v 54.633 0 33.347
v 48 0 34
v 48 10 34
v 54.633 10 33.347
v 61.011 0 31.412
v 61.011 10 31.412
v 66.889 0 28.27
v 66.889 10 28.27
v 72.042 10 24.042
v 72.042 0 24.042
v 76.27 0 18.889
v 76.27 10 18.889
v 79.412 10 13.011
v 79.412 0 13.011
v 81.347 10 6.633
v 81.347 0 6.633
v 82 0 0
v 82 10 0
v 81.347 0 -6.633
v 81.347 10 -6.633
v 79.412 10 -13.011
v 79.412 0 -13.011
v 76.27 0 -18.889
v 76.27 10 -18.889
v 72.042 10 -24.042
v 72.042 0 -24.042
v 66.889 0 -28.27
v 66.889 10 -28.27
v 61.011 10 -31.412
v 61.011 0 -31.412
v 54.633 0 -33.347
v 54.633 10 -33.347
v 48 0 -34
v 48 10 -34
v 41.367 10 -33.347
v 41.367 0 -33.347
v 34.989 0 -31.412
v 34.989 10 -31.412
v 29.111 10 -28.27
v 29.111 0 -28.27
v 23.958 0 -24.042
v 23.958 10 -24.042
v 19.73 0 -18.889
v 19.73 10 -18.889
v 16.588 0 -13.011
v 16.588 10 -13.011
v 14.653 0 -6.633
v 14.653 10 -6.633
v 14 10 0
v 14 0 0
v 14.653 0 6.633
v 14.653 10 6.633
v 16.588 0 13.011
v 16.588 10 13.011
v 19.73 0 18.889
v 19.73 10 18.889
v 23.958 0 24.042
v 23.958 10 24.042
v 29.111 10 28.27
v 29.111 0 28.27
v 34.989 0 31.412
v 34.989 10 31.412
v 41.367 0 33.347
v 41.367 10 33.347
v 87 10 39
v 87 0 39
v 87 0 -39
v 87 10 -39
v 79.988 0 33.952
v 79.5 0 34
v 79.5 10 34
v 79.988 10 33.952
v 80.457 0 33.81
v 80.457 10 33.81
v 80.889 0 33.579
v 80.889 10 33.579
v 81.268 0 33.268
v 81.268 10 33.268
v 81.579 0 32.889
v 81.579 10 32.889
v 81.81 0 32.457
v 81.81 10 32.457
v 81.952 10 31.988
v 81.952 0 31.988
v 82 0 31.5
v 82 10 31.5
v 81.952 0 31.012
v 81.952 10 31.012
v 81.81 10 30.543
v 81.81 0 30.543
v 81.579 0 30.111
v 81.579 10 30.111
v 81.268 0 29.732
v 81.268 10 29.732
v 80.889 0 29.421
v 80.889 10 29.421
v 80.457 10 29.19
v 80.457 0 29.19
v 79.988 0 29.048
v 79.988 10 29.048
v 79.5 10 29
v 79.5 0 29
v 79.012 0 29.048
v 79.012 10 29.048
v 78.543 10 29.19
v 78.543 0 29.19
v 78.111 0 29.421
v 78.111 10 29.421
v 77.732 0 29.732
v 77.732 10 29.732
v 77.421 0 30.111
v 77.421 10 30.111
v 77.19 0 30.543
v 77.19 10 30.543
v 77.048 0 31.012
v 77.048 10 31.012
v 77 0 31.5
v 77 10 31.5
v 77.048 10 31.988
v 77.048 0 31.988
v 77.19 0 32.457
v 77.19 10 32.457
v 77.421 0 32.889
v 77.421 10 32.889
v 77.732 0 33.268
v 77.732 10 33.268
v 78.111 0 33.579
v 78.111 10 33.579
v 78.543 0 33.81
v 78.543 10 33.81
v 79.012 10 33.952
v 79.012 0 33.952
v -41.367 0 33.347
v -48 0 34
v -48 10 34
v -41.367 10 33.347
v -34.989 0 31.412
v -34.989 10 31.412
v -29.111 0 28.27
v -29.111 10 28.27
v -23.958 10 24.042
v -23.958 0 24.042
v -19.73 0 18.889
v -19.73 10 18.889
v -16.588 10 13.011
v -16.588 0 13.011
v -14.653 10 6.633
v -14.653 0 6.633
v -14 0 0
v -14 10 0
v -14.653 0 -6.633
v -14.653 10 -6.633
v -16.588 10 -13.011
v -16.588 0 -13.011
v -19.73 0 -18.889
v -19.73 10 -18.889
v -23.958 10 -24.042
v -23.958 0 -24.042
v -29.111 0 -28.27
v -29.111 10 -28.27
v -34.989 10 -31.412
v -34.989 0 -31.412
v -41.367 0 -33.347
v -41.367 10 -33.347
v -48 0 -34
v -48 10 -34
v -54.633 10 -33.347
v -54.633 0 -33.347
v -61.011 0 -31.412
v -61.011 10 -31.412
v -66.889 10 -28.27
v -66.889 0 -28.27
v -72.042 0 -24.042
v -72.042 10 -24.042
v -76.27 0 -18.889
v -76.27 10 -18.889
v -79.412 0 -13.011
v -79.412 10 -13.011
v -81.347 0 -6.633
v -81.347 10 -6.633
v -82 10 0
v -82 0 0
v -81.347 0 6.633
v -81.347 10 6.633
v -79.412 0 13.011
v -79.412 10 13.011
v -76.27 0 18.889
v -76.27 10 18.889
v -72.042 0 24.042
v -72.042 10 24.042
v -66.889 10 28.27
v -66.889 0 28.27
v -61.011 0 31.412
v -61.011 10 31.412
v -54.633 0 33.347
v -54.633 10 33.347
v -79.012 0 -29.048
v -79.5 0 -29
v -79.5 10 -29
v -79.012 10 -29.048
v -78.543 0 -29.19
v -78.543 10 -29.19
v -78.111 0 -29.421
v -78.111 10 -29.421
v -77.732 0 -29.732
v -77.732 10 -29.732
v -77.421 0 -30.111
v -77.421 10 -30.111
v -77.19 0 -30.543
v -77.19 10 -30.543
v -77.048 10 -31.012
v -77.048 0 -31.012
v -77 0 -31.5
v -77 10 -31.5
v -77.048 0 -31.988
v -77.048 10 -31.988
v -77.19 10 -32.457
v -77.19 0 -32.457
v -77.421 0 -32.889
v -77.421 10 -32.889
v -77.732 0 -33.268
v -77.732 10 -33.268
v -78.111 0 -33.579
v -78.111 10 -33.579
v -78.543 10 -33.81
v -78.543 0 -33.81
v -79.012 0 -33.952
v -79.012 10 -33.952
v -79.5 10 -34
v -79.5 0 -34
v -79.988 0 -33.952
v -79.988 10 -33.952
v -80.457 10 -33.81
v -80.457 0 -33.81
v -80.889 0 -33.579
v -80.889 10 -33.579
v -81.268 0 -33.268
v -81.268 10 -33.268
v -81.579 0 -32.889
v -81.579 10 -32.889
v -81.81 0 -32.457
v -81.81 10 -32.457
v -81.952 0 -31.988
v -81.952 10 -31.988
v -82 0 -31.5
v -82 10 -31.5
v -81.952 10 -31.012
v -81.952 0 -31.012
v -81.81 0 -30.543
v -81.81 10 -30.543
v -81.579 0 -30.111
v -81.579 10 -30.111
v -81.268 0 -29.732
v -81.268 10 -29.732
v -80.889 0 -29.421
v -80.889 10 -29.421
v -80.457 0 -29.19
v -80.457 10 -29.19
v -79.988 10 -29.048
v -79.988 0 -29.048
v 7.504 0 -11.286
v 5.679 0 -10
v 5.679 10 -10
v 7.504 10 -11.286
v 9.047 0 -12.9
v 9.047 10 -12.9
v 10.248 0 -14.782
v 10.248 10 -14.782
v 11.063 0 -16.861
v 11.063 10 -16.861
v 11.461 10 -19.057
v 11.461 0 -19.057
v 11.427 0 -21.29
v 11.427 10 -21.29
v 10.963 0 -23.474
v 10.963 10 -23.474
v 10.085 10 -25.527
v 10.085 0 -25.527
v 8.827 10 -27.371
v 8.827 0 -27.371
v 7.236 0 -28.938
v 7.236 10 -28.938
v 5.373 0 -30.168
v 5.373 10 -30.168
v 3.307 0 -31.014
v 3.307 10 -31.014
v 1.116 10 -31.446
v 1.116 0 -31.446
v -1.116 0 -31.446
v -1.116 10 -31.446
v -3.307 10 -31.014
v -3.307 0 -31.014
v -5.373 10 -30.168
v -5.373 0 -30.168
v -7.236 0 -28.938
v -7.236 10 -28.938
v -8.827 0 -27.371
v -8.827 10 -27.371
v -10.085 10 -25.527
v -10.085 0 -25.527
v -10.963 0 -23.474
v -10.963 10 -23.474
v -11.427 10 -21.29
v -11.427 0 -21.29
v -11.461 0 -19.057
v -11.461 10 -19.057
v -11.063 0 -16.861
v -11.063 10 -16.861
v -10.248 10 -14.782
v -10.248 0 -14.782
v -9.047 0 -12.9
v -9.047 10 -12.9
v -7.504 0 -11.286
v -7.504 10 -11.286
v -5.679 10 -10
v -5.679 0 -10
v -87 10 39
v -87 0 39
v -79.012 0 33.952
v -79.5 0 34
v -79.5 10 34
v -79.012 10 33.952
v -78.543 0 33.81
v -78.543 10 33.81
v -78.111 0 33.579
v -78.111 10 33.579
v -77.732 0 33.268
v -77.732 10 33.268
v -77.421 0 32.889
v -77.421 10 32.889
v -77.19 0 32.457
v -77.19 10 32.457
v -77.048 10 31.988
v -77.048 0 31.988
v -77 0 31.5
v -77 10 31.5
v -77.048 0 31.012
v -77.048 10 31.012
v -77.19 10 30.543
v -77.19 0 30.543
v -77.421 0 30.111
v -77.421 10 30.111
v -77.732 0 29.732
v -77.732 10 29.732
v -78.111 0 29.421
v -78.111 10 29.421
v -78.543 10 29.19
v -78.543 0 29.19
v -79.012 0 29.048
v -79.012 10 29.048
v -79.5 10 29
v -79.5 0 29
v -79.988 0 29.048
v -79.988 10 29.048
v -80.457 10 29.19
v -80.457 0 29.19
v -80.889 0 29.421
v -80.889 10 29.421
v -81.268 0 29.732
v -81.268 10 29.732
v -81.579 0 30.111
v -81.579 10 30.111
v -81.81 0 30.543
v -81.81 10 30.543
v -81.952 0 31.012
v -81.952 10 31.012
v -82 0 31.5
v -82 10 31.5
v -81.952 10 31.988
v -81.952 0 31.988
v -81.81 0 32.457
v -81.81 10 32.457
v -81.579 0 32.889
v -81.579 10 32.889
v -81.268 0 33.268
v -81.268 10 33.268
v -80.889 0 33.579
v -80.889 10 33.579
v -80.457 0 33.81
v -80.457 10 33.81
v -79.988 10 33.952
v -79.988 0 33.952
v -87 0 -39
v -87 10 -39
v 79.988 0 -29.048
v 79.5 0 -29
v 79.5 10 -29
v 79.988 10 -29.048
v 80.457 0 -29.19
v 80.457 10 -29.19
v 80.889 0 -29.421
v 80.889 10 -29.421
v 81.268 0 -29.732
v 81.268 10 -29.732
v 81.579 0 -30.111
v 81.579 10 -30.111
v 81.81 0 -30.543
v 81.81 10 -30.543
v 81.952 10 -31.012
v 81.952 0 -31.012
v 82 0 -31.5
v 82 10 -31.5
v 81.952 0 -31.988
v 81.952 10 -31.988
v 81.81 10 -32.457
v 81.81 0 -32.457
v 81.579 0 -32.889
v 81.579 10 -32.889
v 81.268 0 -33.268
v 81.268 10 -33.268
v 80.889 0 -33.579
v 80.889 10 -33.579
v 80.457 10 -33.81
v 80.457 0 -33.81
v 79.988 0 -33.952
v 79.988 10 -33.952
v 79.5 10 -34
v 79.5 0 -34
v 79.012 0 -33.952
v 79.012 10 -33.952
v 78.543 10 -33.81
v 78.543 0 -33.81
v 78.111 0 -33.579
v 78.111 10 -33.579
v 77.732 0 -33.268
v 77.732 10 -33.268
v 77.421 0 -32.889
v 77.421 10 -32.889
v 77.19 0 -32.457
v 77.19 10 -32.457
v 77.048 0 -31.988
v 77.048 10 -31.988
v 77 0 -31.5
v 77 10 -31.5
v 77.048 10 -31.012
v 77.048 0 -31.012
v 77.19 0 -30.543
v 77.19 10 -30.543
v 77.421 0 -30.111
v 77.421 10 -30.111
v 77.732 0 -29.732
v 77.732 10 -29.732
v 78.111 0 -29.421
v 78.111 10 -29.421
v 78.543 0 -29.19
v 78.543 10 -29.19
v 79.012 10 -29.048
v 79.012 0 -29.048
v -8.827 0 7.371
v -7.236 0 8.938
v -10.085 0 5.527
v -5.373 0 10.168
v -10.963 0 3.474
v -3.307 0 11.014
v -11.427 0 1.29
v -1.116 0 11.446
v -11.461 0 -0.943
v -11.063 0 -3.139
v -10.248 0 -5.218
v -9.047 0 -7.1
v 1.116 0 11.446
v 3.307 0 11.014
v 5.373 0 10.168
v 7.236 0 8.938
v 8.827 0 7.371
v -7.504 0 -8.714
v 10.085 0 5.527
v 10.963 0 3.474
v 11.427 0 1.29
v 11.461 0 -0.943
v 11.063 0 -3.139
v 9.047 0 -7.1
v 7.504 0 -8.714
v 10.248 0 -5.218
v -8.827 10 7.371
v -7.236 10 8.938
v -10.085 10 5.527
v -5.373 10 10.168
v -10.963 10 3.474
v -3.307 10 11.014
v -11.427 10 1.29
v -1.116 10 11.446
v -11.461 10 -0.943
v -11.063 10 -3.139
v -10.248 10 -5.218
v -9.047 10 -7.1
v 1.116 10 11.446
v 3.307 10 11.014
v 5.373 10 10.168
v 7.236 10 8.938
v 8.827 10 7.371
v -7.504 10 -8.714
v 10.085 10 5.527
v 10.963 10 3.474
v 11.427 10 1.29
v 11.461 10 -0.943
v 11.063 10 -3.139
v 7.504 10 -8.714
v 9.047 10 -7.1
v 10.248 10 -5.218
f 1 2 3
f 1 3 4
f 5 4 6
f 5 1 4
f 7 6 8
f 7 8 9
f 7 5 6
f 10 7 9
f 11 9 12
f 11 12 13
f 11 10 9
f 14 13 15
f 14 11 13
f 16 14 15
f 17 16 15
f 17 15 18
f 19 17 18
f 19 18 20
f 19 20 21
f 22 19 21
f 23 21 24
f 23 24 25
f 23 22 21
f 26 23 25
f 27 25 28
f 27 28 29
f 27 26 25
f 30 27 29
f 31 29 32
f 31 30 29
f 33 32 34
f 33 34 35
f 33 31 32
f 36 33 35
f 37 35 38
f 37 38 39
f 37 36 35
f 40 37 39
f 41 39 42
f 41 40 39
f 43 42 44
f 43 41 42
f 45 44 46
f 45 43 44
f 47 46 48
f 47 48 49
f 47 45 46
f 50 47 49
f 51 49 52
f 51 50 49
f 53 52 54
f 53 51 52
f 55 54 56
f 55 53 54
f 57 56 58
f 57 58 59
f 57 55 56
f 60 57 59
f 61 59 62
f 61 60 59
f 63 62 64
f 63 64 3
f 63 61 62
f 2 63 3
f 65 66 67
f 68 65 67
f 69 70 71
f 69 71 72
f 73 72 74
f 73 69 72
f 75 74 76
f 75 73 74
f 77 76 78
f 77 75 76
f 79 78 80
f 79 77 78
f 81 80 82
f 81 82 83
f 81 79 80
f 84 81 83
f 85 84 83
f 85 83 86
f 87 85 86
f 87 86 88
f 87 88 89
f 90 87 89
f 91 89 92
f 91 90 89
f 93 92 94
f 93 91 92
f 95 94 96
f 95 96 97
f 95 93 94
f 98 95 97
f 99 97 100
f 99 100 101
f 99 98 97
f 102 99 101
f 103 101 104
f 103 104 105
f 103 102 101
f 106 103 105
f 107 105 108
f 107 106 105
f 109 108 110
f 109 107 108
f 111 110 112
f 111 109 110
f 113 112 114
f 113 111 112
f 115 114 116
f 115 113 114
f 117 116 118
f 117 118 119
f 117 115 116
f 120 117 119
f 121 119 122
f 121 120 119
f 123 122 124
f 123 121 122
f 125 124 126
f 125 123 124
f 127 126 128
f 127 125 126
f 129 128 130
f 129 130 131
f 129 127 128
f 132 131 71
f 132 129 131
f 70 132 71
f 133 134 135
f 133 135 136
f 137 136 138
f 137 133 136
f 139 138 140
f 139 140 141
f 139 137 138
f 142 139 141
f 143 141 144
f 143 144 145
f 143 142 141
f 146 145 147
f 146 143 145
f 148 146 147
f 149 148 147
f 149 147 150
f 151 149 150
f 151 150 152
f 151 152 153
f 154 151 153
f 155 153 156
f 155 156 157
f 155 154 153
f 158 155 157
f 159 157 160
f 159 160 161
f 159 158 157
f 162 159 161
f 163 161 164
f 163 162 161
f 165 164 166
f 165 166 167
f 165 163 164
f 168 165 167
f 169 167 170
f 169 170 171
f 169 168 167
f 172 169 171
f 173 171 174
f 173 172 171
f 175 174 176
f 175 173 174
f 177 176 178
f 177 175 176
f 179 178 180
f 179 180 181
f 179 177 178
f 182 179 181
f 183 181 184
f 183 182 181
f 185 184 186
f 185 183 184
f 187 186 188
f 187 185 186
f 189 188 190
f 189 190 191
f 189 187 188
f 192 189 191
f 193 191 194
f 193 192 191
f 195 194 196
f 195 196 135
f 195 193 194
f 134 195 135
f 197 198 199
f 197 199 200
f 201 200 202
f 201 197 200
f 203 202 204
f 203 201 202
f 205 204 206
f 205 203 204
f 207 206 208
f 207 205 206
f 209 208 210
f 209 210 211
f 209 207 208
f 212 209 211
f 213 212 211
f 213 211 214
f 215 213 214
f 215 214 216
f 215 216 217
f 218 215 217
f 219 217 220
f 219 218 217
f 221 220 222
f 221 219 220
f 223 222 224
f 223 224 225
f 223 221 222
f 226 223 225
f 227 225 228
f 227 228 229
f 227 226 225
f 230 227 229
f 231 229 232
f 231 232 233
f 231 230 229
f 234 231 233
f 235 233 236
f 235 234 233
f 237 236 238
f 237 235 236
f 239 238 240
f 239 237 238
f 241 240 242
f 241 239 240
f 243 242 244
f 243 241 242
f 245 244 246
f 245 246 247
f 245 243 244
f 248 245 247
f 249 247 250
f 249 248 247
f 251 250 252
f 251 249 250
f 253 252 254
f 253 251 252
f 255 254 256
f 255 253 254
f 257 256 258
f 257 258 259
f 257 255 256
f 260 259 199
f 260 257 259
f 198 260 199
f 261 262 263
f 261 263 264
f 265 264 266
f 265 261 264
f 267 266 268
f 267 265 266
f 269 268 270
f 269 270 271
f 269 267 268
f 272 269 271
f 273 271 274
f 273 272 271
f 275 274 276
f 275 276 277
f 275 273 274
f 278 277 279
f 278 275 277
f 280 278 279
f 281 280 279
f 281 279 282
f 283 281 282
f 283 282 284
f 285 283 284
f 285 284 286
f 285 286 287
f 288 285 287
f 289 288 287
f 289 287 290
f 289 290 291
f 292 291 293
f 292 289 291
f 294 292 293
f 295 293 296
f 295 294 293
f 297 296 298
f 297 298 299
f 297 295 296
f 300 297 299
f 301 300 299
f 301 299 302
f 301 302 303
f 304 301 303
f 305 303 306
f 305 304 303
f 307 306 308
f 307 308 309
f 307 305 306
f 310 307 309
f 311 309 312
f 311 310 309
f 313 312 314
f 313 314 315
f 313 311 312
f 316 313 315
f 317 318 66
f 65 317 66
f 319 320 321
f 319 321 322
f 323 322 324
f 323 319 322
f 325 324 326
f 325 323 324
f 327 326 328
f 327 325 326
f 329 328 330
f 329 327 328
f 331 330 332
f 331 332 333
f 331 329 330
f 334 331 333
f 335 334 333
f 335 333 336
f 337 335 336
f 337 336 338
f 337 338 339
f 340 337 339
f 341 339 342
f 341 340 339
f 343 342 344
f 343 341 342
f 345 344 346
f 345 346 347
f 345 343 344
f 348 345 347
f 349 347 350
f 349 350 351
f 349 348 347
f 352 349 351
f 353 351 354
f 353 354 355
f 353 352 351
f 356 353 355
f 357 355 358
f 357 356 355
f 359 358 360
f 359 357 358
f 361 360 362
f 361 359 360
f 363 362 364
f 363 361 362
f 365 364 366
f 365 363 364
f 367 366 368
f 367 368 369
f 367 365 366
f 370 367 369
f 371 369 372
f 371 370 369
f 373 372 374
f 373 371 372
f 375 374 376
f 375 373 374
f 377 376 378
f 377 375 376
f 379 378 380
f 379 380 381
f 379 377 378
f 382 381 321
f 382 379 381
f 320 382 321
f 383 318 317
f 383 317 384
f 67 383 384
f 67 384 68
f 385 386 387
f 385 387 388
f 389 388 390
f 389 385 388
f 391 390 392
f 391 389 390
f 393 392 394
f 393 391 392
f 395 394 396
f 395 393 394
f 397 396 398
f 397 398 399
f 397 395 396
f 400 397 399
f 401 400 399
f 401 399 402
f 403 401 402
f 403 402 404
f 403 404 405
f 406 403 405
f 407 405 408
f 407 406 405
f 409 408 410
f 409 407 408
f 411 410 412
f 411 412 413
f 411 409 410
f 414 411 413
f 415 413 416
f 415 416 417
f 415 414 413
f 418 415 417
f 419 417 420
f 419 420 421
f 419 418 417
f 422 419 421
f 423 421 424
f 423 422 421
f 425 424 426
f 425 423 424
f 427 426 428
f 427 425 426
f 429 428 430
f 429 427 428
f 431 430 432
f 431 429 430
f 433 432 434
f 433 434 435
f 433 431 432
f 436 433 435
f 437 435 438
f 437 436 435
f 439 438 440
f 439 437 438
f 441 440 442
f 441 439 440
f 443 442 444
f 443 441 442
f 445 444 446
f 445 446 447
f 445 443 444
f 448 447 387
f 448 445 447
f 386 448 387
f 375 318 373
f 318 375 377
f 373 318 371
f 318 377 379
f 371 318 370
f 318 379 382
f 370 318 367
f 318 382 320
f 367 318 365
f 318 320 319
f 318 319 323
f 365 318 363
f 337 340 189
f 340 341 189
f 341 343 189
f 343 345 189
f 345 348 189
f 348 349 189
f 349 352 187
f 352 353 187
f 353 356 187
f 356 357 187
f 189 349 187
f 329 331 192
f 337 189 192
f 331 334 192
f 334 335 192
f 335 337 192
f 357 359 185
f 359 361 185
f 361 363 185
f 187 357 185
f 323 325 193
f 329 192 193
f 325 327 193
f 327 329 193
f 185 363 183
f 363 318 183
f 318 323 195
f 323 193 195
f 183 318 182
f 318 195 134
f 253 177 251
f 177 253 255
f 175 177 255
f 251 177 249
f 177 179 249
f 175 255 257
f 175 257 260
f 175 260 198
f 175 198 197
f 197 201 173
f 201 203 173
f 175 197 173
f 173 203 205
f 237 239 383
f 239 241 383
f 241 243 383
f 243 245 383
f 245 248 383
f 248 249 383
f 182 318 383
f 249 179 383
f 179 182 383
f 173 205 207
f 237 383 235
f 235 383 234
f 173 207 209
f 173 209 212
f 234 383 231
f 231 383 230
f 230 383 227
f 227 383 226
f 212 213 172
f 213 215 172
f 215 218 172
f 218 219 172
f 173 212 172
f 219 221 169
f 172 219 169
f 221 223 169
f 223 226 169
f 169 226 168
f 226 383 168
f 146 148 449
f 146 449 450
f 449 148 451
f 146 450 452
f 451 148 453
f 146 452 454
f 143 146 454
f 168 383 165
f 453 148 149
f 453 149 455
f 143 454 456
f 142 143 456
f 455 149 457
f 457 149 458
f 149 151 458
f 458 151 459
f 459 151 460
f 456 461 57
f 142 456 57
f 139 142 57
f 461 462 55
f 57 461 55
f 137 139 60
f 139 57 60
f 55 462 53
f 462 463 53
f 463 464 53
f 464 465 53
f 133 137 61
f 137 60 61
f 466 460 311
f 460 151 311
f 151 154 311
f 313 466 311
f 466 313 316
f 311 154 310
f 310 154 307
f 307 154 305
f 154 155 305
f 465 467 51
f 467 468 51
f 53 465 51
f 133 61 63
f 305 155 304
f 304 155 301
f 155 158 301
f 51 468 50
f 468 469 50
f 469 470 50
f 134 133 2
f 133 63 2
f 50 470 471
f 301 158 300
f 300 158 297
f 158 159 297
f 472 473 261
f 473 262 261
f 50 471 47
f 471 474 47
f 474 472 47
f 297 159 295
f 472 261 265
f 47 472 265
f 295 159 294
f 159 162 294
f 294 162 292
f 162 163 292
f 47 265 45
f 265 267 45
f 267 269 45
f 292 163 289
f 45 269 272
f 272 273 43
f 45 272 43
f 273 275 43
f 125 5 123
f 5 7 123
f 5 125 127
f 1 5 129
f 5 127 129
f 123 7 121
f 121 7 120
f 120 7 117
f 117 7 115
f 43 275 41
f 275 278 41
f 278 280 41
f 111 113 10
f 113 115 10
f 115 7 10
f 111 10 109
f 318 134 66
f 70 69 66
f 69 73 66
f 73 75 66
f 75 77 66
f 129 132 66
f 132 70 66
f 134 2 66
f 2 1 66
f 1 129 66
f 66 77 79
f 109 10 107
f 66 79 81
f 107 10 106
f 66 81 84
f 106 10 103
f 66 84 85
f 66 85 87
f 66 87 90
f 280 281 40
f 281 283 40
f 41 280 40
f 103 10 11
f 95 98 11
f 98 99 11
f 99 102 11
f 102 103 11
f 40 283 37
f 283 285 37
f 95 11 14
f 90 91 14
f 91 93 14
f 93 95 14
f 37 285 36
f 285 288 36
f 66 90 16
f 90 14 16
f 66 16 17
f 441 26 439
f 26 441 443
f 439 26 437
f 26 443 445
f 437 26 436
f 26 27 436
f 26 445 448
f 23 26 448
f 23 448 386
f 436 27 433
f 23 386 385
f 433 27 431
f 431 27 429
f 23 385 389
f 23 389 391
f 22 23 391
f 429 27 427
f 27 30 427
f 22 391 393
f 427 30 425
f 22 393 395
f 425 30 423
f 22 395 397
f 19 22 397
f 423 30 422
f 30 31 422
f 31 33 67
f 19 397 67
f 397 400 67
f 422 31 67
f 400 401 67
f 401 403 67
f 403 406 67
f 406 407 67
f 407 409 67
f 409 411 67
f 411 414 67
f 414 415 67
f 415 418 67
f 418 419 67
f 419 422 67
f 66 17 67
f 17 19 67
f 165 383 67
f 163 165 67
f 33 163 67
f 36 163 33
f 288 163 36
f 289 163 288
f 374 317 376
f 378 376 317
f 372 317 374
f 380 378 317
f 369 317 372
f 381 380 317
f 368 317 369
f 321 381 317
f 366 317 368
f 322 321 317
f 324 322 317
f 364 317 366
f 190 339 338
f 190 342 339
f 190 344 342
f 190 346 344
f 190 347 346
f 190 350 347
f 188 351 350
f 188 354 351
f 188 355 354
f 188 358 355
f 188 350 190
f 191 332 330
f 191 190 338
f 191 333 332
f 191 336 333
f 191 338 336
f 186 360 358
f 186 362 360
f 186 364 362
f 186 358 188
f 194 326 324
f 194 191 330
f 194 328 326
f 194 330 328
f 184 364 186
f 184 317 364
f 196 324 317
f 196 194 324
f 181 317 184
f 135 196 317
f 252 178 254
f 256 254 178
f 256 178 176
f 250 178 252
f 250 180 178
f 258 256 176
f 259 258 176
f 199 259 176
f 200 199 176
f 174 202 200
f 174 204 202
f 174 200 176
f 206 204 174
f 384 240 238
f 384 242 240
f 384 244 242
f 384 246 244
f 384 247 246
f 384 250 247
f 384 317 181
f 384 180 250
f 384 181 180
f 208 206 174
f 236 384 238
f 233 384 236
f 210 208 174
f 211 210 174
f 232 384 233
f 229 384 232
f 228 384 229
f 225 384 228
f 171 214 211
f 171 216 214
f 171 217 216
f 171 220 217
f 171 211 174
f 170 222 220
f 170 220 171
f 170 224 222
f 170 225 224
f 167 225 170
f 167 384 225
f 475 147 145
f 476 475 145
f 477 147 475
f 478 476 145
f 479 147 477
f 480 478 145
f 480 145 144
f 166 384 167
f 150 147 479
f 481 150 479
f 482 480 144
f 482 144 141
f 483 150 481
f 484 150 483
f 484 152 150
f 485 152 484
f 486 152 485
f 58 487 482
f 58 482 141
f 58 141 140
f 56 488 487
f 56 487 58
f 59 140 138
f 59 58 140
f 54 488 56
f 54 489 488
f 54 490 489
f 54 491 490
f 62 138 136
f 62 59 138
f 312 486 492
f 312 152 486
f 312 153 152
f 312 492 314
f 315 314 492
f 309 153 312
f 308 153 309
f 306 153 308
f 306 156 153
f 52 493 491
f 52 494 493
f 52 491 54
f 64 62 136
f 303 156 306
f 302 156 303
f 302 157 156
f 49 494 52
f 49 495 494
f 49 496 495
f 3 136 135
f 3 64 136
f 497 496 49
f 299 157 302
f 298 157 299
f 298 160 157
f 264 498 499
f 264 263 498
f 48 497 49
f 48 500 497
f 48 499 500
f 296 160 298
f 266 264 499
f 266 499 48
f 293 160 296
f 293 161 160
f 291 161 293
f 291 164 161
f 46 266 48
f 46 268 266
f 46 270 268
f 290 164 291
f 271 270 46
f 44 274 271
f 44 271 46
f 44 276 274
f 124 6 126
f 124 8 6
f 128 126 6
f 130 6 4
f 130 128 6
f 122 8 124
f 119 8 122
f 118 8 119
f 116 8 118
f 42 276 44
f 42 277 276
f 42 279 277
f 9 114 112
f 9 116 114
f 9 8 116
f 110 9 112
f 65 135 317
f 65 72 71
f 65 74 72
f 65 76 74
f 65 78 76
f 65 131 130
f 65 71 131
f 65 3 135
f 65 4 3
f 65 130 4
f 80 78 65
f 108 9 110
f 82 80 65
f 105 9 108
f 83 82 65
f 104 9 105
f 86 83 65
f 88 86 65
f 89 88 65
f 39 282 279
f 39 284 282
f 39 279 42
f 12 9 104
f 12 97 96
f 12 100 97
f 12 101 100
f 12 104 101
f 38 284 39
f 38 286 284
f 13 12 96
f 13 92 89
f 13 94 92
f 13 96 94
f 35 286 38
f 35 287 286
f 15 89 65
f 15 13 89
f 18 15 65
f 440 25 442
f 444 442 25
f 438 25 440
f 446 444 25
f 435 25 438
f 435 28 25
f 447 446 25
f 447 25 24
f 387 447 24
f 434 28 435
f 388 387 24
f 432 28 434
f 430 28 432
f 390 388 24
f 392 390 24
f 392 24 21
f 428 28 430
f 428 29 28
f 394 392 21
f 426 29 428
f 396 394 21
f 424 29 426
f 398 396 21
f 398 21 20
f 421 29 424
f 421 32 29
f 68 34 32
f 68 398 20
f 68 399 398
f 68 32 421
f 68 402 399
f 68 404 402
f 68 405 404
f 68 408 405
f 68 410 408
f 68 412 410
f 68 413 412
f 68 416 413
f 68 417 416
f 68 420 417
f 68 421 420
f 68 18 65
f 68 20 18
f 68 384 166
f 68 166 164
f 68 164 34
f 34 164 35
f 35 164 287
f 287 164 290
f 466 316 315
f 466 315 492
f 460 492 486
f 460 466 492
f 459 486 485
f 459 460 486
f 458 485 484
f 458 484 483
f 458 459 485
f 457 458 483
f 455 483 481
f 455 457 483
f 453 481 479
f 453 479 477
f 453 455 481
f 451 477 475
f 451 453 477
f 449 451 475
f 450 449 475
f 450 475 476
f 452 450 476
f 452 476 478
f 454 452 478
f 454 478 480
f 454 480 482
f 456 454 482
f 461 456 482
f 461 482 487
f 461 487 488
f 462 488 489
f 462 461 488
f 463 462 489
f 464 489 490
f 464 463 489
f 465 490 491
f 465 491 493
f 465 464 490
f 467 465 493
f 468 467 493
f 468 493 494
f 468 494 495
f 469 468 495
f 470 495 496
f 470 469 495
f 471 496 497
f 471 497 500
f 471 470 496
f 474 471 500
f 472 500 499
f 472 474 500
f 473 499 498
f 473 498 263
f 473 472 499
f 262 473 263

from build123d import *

# Parameters (mm, degrees)
SKETCH1_W           = 174
SKETCH1_H           = 78
SKETCH1_R           = 34
SKETCH1_R_2         = 2.5
BOSS_EXTRUDE1_DEPTH = 10


with BuildPart() as part:
    # Sketch1 → Boss-Extrude1 (new body)
    with BuildSketch(Plane(origin=(0, 0, 0), x_dir=(1, 0, 0), z_dir=(0, 1, 0))):
        Rectangle(SKETCH1_W, SKETCH1_H)
        with Locations(Location((48, 0, 0), (0, 0, 270))):
            Circle(SKETCH1_R, mode=Mode.SUBTRACT)
        with Locations(Location((-48, 0, 0), (0, 0, 270))):
            Circle(SKETCH1_R, mode=Mode.SUBTRACT)
        with Locations(Location((-79.5, 31.5, 0), (0, 0, 270))):
            Circle(SKETCH1_R_2, mode=Mode.SUBTRACT)
        with Locations(Location((-79.5, -31.5, 0), (0, 0, 270))):
            Circle(SKETCH1_R_2, mode=Mode.SUBTRACT)
        with Locations(Location((79.5, -31.5, 0), (0, 0, 270))):
            Circle(SKETCH1_R_2, mode=Mode.SUBTRACT)
        with Locations(Location((79.5, 31.5, 0), (0, 0, 270))):
            Circle(SKETCH1_R_2, mode=Mode.SUBTRACT)
        with BuildLine():
            ThreePointArc((-5.678908346, 10), (0, -11.5), (5.678908346, 10))
            ThreePointArc((5.678908346, 10), (0, 31.5), (-5.678908346, 10))
        make_face(mode=Mode.SUBTRACT)
    extrude(amount=BOSS_EXTRUDE1_DEPTH)


solid = part.part
